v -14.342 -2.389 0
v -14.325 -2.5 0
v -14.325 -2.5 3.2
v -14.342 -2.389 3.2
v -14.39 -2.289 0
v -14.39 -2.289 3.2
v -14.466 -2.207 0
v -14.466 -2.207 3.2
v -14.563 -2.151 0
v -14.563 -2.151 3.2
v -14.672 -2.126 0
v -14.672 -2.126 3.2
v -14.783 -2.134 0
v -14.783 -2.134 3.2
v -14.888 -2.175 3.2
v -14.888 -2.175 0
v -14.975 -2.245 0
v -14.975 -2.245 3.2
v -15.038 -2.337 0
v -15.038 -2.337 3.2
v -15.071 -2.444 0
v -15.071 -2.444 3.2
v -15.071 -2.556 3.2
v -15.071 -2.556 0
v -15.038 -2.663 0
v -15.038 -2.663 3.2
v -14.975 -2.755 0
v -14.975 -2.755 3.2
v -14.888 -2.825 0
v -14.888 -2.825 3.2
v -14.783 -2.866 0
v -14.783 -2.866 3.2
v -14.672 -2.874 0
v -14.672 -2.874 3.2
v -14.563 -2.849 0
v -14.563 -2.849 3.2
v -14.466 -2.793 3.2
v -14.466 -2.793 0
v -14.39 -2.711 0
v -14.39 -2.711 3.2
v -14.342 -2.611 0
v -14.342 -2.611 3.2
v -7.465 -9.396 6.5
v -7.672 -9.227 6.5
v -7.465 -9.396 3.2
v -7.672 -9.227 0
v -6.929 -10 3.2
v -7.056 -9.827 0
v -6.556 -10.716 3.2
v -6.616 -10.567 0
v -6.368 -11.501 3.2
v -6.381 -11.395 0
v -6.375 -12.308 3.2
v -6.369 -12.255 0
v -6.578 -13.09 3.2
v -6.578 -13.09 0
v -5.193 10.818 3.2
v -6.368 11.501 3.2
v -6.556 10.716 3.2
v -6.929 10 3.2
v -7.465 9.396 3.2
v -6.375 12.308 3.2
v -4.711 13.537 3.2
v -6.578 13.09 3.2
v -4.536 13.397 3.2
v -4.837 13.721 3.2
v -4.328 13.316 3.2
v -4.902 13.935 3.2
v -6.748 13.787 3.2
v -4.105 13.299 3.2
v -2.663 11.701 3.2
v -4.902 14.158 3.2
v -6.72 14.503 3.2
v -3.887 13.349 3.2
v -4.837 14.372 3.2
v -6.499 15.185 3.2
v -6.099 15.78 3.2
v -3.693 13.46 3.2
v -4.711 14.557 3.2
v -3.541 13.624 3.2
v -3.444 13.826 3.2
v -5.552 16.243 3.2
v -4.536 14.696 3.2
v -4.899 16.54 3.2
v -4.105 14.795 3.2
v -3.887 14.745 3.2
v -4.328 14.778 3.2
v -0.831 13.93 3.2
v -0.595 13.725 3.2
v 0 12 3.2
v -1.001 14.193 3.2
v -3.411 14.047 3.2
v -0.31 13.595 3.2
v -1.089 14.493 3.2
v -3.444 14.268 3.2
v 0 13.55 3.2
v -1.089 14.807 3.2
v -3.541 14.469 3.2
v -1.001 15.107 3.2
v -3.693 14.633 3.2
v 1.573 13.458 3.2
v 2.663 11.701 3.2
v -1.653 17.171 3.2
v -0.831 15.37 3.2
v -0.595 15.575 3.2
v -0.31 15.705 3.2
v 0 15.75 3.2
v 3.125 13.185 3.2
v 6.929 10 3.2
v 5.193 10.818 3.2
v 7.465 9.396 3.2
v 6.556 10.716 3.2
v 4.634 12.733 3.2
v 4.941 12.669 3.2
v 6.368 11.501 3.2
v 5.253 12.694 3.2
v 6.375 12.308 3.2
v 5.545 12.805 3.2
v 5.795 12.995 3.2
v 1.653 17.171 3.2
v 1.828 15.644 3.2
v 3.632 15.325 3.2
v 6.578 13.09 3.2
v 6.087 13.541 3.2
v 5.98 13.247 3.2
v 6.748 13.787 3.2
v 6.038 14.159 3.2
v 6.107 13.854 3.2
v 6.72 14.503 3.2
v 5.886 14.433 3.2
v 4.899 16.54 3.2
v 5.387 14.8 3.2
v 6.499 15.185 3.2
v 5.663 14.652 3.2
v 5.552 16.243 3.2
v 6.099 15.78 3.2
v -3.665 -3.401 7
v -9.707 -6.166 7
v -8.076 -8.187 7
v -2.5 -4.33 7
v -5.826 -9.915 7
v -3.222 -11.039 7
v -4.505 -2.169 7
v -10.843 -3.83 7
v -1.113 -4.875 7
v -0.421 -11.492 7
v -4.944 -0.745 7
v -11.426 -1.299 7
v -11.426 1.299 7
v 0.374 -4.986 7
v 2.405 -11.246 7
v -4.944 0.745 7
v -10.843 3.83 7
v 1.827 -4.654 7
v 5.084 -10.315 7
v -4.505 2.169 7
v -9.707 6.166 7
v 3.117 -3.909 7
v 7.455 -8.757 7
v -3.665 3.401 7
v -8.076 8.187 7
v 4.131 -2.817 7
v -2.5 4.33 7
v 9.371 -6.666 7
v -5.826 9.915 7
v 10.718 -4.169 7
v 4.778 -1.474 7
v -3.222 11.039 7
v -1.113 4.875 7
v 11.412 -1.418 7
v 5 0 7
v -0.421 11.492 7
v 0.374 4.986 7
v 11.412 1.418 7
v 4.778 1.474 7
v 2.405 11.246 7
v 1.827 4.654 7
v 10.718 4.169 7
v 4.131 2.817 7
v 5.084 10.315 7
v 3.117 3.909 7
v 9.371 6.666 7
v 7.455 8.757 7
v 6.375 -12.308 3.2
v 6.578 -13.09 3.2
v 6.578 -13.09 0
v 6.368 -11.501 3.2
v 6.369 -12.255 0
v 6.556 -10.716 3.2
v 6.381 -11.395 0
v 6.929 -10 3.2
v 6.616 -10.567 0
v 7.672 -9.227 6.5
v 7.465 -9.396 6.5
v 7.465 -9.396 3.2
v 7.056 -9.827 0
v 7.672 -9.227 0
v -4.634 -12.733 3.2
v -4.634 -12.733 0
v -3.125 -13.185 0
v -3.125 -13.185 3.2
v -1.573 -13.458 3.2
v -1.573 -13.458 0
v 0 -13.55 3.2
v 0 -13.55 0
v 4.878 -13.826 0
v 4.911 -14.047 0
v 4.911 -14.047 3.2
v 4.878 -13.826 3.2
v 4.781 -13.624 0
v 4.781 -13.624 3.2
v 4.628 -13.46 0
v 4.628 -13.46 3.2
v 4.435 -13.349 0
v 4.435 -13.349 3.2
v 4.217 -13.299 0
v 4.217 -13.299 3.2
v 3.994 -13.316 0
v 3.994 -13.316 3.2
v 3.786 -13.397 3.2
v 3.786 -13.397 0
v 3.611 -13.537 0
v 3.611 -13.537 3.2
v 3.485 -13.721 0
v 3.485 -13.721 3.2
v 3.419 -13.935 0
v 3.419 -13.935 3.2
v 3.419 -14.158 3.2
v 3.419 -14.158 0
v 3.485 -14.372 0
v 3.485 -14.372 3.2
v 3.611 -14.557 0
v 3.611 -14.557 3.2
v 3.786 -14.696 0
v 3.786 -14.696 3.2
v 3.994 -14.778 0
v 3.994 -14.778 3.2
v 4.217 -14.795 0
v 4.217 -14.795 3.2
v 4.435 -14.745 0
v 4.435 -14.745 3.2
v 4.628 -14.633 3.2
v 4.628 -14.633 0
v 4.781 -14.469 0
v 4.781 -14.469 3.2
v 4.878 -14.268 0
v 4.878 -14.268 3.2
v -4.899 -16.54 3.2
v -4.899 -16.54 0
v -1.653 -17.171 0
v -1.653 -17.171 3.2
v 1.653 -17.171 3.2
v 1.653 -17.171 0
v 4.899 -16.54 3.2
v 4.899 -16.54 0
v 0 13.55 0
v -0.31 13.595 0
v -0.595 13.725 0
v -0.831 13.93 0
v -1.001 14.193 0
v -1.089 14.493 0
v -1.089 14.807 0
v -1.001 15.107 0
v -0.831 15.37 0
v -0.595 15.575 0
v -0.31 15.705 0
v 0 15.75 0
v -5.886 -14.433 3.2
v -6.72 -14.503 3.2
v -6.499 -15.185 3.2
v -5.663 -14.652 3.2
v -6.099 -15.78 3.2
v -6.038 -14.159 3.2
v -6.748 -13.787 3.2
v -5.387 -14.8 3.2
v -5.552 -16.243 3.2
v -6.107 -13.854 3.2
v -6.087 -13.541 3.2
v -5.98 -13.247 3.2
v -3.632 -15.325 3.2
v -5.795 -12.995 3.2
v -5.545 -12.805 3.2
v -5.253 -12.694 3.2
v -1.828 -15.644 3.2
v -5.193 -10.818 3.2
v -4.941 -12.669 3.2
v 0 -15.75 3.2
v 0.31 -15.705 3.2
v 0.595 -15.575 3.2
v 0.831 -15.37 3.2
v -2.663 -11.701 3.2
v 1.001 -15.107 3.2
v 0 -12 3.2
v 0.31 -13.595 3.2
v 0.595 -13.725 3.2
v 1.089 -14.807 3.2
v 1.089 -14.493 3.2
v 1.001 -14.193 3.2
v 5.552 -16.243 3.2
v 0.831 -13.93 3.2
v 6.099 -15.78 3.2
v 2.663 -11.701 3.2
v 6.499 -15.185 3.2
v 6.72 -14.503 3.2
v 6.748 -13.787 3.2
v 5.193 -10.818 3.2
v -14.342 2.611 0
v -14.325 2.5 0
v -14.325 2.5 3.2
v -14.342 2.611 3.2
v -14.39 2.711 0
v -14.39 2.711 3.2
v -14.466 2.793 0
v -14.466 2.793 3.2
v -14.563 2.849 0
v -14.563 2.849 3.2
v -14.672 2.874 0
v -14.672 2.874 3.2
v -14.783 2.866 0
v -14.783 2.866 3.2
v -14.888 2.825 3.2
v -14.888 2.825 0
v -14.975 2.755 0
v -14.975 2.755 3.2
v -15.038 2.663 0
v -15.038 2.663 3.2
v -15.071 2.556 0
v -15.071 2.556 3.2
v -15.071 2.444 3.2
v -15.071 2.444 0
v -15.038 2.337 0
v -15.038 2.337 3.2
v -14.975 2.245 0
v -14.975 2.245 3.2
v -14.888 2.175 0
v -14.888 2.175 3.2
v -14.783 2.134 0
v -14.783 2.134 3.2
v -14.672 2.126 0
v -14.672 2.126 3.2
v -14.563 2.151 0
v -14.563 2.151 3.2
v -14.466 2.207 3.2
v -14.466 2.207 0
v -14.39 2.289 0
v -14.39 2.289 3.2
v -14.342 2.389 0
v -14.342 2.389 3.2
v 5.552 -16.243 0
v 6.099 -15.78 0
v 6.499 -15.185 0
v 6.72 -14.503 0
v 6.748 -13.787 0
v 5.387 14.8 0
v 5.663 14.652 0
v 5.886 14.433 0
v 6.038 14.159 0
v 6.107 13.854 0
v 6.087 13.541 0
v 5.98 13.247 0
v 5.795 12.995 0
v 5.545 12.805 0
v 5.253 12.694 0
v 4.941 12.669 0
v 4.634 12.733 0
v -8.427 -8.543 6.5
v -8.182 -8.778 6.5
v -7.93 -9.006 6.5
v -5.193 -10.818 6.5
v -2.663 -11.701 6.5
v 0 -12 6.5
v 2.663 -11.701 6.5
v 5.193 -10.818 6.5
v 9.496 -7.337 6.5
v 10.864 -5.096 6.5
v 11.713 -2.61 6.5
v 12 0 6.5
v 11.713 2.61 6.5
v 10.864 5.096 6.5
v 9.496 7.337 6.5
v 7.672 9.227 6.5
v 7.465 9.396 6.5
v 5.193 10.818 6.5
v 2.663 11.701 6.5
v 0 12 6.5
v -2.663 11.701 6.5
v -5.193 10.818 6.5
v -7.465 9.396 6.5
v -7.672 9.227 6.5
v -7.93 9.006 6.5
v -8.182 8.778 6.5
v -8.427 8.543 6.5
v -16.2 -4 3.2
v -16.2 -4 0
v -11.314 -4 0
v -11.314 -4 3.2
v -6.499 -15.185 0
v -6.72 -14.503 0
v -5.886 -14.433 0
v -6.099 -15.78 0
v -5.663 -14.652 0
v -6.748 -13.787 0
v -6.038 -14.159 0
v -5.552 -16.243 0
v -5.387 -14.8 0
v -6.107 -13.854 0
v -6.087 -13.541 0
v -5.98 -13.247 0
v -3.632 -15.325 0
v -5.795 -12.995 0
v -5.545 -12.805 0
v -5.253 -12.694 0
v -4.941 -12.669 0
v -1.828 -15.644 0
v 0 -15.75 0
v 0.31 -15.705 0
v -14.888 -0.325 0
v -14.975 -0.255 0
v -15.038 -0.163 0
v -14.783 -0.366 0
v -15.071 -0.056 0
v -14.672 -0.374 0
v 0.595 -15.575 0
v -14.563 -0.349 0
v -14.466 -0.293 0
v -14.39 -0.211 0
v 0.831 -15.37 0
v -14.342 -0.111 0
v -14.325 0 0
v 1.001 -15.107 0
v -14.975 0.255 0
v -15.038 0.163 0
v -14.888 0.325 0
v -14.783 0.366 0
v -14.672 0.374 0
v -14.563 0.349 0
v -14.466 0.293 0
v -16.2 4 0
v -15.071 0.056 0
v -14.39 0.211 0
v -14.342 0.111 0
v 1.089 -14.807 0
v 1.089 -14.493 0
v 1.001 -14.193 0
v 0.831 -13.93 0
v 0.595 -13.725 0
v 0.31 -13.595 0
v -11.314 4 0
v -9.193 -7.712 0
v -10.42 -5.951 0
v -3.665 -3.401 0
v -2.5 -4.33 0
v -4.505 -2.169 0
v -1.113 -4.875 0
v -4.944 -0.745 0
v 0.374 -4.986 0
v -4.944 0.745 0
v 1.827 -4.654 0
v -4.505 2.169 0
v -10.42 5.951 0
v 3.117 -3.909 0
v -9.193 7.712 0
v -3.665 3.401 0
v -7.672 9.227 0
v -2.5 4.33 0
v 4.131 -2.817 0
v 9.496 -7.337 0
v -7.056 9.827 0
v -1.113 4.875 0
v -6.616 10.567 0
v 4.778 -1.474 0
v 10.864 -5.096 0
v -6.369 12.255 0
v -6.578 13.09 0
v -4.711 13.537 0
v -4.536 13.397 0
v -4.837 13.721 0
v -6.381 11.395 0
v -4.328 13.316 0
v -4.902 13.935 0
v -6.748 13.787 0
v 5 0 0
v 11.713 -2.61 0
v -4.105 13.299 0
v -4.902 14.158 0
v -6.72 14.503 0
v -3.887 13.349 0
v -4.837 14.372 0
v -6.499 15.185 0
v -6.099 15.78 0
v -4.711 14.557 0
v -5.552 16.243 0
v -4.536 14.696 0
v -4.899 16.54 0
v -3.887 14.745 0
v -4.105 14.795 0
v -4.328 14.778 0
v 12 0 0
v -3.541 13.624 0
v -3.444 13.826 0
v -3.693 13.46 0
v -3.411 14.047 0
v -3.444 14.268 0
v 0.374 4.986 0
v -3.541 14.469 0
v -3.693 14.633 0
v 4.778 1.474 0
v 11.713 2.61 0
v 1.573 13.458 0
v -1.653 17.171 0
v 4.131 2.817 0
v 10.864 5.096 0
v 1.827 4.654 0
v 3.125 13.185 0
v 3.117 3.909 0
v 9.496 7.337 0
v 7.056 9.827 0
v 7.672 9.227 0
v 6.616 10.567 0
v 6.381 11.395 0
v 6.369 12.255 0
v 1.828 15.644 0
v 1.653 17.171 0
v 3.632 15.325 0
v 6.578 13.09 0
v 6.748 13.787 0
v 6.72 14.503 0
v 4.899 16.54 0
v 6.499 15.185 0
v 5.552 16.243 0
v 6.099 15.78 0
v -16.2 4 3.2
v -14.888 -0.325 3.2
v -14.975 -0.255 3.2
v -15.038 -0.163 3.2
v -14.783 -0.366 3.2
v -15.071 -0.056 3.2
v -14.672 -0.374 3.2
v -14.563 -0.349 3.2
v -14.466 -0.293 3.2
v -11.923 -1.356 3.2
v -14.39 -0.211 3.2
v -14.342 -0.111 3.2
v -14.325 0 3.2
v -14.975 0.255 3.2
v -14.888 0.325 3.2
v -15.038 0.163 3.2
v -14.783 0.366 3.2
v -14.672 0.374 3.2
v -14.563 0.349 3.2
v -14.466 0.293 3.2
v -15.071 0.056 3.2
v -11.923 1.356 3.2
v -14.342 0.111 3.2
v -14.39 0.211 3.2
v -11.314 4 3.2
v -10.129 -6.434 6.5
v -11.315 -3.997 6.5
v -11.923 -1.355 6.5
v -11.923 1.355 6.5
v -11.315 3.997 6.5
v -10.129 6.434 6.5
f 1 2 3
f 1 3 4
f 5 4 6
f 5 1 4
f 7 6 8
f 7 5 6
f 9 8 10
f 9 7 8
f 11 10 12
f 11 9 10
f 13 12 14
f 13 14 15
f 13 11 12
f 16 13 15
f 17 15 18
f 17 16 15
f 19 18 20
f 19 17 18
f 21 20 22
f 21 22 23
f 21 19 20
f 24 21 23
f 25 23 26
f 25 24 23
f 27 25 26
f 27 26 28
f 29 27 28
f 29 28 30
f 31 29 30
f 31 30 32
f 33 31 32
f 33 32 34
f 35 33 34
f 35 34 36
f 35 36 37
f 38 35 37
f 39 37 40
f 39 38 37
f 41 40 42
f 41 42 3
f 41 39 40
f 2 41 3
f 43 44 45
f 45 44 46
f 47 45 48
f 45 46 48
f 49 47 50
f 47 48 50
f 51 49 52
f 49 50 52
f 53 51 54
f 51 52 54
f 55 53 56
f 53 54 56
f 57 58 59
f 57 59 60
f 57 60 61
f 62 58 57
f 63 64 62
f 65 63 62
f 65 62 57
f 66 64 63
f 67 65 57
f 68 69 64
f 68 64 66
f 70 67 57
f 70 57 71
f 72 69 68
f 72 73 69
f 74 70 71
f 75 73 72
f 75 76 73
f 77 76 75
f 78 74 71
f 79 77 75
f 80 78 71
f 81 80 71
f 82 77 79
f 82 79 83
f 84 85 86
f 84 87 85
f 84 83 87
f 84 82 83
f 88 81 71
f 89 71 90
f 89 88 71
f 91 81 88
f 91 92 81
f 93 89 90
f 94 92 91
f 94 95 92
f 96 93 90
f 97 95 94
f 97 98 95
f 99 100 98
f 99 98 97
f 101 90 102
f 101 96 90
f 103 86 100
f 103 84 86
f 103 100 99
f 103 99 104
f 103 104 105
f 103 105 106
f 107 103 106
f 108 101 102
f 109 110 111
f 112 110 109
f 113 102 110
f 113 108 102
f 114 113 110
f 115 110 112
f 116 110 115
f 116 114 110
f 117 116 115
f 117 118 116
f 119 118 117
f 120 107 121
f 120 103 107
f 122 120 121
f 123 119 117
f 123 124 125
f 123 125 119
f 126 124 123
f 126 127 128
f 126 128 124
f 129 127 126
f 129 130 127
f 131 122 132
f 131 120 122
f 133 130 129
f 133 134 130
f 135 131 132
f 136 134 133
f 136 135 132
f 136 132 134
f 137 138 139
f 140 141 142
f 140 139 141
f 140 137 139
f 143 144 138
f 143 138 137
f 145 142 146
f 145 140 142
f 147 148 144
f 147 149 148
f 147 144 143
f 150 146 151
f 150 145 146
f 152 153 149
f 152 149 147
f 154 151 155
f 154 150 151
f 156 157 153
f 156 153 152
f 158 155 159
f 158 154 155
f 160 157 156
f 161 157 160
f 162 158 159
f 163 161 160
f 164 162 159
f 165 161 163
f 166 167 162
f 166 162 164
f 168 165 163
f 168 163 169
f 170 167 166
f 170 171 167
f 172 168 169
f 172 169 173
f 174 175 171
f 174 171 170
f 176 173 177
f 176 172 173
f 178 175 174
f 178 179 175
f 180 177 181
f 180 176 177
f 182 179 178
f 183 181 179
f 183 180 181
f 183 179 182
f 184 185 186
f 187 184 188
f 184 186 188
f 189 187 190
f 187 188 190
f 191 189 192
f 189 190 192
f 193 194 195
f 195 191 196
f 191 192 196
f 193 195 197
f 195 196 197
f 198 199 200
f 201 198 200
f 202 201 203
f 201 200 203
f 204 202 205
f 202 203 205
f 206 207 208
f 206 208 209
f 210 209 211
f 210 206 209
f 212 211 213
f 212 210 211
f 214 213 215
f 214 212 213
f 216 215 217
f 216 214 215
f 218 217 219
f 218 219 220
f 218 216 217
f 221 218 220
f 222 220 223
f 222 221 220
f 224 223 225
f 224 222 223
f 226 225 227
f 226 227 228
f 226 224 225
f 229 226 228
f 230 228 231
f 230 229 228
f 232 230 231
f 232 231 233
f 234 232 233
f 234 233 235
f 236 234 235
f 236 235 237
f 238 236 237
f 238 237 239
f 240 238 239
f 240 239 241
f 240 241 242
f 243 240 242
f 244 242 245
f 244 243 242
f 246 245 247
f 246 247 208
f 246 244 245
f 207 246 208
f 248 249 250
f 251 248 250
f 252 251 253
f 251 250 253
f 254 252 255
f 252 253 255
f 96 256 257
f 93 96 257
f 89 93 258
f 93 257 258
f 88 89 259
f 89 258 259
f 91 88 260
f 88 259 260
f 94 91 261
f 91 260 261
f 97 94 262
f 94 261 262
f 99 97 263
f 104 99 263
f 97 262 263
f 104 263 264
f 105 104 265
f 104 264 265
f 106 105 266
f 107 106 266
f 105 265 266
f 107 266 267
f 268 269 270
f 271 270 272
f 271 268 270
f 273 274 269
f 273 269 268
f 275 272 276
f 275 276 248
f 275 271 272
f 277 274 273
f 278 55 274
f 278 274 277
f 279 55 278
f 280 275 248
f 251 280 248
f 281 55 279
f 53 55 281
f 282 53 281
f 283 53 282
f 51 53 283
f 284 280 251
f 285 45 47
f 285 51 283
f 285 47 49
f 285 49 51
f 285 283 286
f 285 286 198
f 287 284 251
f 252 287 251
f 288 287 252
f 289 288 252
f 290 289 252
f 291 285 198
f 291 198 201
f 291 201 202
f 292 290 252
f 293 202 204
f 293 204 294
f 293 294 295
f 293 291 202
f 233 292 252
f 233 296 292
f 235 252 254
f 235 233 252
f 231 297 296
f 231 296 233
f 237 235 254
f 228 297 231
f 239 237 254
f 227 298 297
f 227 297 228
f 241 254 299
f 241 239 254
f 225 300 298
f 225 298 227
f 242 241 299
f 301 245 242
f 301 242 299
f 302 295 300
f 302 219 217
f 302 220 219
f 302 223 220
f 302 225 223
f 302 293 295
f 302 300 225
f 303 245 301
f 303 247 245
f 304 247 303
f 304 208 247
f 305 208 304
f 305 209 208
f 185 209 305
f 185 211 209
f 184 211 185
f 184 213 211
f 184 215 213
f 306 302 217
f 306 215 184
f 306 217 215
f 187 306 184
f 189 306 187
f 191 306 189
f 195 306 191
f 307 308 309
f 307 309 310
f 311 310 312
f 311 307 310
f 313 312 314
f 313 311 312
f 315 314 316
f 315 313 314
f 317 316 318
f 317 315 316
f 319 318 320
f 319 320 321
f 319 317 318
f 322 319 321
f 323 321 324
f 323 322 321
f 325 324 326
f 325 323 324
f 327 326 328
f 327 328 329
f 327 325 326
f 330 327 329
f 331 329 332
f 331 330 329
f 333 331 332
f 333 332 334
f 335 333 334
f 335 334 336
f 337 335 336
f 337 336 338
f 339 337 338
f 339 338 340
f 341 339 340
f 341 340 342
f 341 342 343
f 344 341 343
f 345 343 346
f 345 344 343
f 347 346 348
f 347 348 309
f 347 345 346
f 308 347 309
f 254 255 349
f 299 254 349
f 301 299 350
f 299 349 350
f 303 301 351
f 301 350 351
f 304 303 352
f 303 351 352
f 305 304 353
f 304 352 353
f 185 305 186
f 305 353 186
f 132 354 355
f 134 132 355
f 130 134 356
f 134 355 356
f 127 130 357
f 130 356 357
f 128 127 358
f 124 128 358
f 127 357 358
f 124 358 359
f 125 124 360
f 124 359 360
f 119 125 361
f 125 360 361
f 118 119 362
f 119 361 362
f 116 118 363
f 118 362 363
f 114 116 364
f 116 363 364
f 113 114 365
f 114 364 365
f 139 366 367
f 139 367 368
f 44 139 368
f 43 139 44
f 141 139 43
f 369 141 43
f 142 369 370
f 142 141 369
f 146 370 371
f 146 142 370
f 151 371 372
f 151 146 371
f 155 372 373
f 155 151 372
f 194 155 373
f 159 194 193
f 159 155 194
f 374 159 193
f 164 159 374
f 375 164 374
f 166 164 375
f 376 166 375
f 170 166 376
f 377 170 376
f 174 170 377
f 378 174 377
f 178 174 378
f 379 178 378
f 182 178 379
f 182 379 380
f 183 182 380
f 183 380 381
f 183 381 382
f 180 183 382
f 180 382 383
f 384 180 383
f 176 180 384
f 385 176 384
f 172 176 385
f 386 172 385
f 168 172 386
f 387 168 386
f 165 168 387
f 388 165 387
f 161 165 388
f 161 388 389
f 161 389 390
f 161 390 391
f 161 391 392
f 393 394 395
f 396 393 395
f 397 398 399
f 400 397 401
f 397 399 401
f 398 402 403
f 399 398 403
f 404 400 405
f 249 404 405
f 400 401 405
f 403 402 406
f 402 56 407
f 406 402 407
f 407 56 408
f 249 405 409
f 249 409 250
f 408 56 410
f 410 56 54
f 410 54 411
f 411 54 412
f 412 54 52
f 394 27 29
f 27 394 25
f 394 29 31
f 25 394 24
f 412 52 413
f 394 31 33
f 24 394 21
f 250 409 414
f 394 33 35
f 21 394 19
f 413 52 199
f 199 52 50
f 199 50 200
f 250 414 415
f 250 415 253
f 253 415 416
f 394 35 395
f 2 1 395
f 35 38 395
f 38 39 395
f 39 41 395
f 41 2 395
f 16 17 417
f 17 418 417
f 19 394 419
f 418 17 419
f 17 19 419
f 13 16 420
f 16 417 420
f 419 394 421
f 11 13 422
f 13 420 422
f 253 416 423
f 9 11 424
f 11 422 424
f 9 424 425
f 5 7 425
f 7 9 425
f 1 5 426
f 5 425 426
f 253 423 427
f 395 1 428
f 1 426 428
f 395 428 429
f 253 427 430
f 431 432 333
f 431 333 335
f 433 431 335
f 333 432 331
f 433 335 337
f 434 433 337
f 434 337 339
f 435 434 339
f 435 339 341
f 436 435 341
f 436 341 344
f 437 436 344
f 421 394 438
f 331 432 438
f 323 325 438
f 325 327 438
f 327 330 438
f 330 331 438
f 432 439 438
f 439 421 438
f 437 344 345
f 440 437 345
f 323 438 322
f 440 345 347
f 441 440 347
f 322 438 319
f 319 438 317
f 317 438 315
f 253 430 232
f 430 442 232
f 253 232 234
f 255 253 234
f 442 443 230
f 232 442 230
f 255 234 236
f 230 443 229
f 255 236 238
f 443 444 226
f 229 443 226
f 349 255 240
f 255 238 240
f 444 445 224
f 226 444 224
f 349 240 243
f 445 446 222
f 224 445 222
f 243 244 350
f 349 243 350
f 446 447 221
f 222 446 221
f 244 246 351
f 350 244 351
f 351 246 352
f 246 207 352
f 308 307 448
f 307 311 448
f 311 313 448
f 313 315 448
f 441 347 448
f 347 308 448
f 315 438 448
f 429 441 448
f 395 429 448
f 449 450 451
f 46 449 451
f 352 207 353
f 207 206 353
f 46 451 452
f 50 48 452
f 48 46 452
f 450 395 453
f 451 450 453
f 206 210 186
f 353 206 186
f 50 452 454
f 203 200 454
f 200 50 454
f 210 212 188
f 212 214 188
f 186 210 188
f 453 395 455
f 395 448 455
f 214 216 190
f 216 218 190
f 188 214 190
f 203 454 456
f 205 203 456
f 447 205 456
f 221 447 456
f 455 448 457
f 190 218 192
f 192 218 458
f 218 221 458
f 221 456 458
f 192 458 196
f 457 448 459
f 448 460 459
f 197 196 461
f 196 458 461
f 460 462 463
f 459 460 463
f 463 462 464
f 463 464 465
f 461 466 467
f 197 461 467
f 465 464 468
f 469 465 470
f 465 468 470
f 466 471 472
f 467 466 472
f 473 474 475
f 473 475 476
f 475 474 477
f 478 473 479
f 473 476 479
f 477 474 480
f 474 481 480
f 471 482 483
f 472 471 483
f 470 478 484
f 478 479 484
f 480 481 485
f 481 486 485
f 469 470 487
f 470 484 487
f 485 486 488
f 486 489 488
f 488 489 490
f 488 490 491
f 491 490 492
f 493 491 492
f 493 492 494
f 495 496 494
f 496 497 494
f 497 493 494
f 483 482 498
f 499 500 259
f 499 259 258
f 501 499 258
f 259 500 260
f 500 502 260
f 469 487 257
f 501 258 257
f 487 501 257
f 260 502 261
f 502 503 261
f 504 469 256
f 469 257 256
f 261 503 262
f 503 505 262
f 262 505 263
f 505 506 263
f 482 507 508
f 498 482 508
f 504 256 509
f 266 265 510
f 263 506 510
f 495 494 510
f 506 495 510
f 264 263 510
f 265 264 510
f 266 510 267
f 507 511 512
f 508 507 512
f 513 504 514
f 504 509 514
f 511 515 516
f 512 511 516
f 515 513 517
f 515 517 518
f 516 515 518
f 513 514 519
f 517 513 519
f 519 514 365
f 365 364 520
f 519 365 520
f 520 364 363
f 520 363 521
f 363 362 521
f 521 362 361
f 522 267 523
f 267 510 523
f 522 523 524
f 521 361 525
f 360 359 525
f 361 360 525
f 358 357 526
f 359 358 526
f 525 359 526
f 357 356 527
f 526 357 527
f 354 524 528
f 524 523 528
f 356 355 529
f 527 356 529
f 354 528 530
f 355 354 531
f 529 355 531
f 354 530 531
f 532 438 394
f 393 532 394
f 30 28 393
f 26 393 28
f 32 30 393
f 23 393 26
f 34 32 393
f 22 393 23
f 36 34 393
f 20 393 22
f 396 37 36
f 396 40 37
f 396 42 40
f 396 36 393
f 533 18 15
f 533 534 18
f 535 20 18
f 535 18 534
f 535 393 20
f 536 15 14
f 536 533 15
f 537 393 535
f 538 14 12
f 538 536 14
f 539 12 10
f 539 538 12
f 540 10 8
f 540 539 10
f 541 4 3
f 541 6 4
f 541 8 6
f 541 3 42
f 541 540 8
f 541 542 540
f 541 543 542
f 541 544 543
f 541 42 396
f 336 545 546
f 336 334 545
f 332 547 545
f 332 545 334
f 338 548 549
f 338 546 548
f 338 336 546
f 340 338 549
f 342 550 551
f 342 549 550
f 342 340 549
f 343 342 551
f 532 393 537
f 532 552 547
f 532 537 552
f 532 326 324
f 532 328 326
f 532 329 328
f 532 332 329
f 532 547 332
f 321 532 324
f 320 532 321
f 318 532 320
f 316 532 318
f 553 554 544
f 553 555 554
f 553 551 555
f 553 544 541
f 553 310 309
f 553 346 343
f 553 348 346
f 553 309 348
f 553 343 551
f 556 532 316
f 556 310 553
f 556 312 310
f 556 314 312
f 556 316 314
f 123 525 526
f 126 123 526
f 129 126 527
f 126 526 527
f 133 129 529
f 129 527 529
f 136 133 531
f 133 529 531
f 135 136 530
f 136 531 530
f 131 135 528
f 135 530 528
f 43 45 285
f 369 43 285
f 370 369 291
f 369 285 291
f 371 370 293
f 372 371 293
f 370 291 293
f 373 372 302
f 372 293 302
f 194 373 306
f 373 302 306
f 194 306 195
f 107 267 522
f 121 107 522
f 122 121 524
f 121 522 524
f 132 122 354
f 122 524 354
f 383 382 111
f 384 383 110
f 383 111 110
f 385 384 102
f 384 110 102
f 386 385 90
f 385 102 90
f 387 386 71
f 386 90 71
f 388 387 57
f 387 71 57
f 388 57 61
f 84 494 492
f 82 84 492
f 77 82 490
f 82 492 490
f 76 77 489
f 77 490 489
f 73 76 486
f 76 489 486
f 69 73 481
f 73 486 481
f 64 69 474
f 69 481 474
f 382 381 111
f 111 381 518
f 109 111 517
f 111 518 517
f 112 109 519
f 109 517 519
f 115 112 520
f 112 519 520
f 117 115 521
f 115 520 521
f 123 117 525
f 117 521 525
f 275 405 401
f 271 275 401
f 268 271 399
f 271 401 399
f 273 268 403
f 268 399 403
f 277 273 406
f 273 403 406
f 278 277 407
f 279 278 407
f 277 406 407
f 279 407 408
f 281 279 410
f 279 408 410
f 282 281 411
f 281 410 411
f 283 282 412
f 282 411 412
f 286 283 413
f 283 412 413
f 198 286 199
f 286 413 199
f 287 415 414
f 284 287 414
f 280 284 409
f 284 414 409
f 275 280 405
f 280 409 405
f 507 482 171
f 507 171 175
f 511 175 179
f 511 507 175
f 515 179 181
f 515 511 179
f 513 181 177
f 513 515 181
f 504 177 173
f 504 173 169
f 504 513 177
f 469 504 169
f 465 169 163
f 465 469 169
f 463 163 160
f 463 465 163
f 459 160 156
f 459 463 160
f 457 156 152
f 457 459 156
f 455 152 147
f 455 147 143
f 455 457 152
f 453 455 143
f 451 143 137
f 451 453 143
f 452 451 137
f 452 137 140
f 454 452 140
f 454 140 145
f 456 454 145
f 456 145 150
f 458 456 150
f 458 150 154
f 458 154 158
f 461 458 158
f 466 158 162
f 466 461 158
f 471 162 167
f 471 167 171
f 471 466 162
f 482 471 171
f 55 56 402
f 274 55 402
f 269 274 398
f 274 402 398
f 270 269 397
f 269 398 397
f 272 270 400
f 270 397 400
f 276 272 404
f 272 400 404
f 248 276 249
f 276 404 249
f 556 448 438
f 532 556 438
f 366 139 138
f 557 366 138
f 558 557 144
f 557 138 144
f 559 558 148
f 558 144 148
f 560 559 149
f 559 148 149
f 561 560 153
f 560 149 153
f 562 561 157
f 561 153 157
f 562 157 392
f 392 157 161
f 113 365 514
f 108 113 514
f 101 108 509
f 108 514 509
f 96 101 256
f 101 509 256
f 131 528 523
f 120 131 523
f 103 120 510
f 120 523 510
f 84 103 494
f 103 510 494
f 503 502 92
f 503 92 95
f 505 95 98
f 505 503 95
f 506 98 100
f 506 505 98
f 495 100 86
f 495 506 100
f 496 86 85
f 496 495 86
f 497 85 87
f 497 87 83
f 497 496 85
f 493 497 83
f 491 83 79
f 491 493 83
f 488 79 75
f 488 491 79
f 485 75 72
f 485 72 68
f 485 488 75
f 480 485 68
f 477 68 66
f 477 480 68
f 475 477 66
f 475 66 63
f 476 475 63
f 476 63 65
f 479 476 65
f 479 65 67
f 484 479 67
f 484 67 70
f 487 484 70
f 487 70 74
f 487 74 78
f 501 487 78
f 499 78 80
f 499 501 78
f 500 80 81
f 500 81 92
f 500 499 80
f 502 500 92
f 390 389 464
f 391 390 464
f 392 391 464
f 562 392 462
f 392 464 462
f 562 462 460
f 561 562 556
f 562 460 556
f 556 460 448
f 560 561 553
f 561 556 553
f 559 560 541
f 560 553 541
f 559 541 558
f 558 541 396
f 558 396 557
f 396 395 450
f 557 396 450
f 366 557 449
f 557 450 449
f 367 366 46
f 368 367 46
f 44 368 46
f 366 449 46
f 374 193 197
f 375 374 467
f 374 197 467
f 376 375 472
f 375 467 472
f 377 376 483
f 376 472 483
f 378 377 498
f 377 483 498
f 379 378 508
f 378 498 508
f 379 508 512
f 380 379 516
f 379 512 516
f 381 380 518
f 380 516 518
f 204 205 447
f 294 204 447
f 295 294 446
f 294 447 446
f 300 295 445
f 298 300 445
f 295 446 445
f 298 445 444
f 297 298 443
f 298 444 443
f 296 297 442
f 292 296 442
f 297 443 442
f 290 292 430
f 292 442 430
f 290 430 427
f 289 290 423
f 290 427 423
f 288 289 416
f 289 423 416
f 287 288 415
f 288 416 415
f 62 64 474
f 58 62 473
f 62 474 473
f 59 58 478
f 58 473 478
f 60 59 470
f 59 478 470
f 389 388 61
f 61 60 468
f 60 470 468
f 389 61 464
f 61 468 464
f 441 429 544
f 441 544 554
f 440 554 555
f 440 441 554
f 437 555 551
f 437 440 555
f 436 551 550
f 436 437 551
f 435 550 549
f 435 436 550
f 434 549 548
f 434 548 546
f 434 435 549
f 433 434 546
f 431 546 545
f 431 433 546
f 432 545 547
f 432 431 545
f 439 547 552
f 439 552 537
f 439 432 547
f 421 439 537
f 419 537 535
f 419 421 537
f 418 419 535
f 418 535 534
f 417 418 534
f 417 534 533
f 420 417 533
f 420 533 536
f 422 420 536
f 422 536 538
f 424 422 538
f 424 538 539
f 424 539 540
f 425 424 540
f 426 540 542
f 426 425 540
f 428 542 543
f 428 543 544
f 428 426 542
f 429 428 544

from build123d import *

# Parameters (mm, degrees)
SKETCH1_R           = 5
BOSS_EXTRUDE1_DEPTH = 7
SKETCH1_3_R         = 0.75
SKETCH1_3_R_2       = 0.37500000000000105
SKETCH1_3_R_3       = 0.375000000000001
SKETCH1_3_R_4       = 0.7500000000000001
BOSS_EXTRUDE2_DEPTH = 3.2
CHAMFER1_SIZE       = 0.5


with BuildPart() as part:
    # Sketch1 → Boss-Extrude1 (new body)
    with BuildSketch(Plane.XY):
        with BuildLine():
            ThreePointArc((-7.67241426287147, 9.226811983501475), (-9.846222893058407, 6.8594383691533025), (-11.31370849898476, 4))
            ThreePointArc((-11.31370849898476, 4), (-12, 1.47e-15), (-11.313708498984761, -3.9999999999999973))
            ThreePointArc((-11.313708498984761, -3.9999999999999973), (-9.846222893058428, -6.859438369153274), (-7.672414262871522, -9.226811983501433))
            ThreePointArc((-7.672414262871518, -9.226811983501431), (-7.566872377799013, -9.309109229750973), (-7.464748895834485, -9.395611950380768))
            ThreePointArc((-7.464748895834483, -9.395611950380767), (1.911e-14, -12), (7.464748895834521, -9.395611950380736))
            ThreePointArc((7.464748895834522, -9.395611950380738), (7.566872377798977, -9.309109229751012), (7.6724142628714045, -9.226811983501536))
            ThreePointArc((7.672414262871396, -9.226811983501538), (10.864367702596793, -5.0956368024783405), (12, -2.94e-15))
            ThreePointArc((12, 0), (10.864367702596812, 5.095636802478297), (7.672414262871458, 9.226811983501484))
            ThreePointArc((7.672414262871453, 9.22681198350148), (7.5668723777987985, 9.309109229751144), (7.4647488958341315, 9.395611950381072))
            ThreePointArc((7.464748895834118, 9.395611950381056), (-2.7638e-13, 12), (-7.464748895834552, 9.395611950380712))
            ThreePointArc((-7.464748895834552, 9.395611950380712), (-7.566872377799023, 9.30910922975097), (-7.672414262871468, 9.226811983501477))
        make_face()
        Circle(SKETCH1_R, mode=Mode.SUBTRACT)
    extrude(amount=BOSS_EXTRUDE1_DEPTH)

    # Sketch1<3> → Boss-Extrude2 (add)
    # profile 1 of 3: a face of its own
    with BuildSketch(Plane.XY):
        with BuildLine():
            ThreePointArc((-6.57839458957231, 13.089966563130929), (-6.4376977661817865, 11.10270546197924), (-7.464748895834552, 9.395611950380712))
            ThreePointArc((-7.464748895834552, 9.395611950380712), (-2.7638e-13, 12), (7.464748895834118, 9.395611950381056))
            ThreePointArc((7.4647488958341315, 9.395611950381072), (6.437697766181707, 11.102705461979504), (6.578394589572291, 13.089966563130933))
            ThreePointArc((6.578394589572291, 13.089966563130933), (6.498593335336791, 15.184618723292306), (4.899264696142665, 16.53964042647633))
            ThreePointArc((4.899264696142668, 16.539640426476332), (-9.55e-15, 17.250000000000007), (-4.899264696142684, 16.539640426476325))
            ThreePointArc((-4.899264696142685, 16.539640426476325), (-6.49859333533681, 15.184618723292303), (-6.57839458957231, 13.089966563130929))
        make_face()
        with Locations((-4.160824799912482, 14.046709115819024)):
            Circle(SKETCH1_3_R, mode=Mode.SUBTRACT)
        with BuildLine():
            ThreePointArc((-2e-17, 13.55), (-1.1000000000000003, 14.65), (1.8e-16, 15.75))
            ThreePointArc((1.8e-16, 15.75), (2.734958798254155, 15.510722109942275), (5.3868172573792865, 14.800158777378059))
            ThreePointArc((5.3868172573792865, 14.800158777378059), (6.04425698258554, 13.390274736855329), (4.634372942062814, 12.732835011649062))
            ThreePointArc((4.634372942062814, 12.732835011649065), (2.352932807386907, 13.344145053315419), (-2e-17, 13.550000000000002))
        make_face(mode=Mode.SUBTRACT)
    # profile 2 of 3: a face of its own
    with BuildSketch(Plane.XY):
        with BuildLine():
            Line((-11.313708498984761, 3.9999999999999982), (-16.2, 4))
            Line((-16.2, 4), (-16.2, -4))
            Line((-16.2, -4), (-11.313708498984761, -3.9999999999999982))
            ThreePointArc((-11.313708498984761, -3.9999999999999973), (-12, 1.47e-15), (-11.31370849898476, 4))
        make_face()
        with Locations((-14.7, -2.5)):
            Circle(SKETCH1_3_R_2, mode=Mode.SUBTRACT)
        with Locations((-14.7, 0)):
            Circle(SKETCH1_3_R_3, mode=Mode.SUBTRACT)
        with Locations((-14.7, 2.5)):
            Circle(SKETCH1_3_R_2, mode=Mode.SUBTRACT)
    # profile 3 of 3: a face of its own
    with BuildSketch(Plane.XY):
        with BuildLine():
            ThreePointArc((7.464748895834521, -9.395611950380736), (1.911e-14, -12), (-7.464748895834483, -9.395611950380767))
            ThreePointArc((-7.464748895834485, -9.395611950380768), (-6.437697766181827, -11.102705461979276), (-6.578394589572382, -13.08996656313089))
            ThreePointArc((-6.578394589572383, -13.08996656313089), (-6.498593335336874, -15.184618723292306), (-4.899264696142685, -16.539640426476325))
            ThreePointArc((-4.899264696142686, -16.539640426476325), (-2e-15, -17.250000000000004), (4.899264696142684, -16.53964042647633))
            ThreePointArc((4.899264696142683, -16.539640426476325), (6.498593335336733, -15.184618723292296), (6.57839458957222, -13.089966563130977))
            ThreePointArc((6.57839458957222, -13.089966563130977), (6.437697766181717, -11.102705461979264), (7.464748895834522, -9.395611950380738))
        make_face()
        with BuildLine():
            ThreePointArc((-4.634372942062905, -12.732835011649033), (-2.3529328073870017, -13.344145053315408), (-9.46e-14, -13.550000000000006))
            ThreePointArc((-9.46e-14, -13.550000000000004), (1.099999999999898, -14.650000000000011), (-1.1017e-13, -15.750000000000004))
            ThreePointArc((-1.1017e-13, -15.750000000000004), (-2.734958798254263, -15.510722109942261), (-5.3868172573793895, -14.800158777378023))
            ThreePointArc((-5.3868172573793895, -14.800158777378021), (-6.044256982585632, -13.390274736855288), (-4.634372942062904, -12.73283501164903))
        make_face(mode=Mode.SUBTRACT)
        with Locations((4.160824799912384, -14.046709115819057)):
            Circle(SKETCH1_3_R_4, mode=Mode.SUBTRACT)
    extrude(amount=BOSS_EXTRUDE2_DEPTH)

    # Chamfer1
    # the kernel refuses this chamfer: 0.5 mm, written as the material it takes off along each edge
    with BuildSketch(Plane(origin=(4.4e-16, 8.88e-15, 7), x_dir=(-0.7022542311891906, -0.7119262565581345, 0), z_dir=(-0.7119262565581345, 0.7022542311891906, 0))) as chamfer1_piece_1:
        Polygon((12.00000000000001, -CHAMFER1_SIZE), (12.00000000000001 - CHAMFER1_SIZE, 0), (12.00000000000001, 0), align=None)
    revolve(axis=Axis((4.4e-16, 8.88e-15, 7), (0, 0, 1)), revolution_arc=89.21628448783436, mode=Mode.SUBTRACT)
    with BuildSketch(Plane(origin=(0, -1.55e-15, 7), x_dir=(0.5534232565861029, 0.8329001735319981, 0), z_dir=(-0.8329001735319981, 0.5534232565861029, 0))) as chamfer1_piece_2:
        Polygon((12.000000000000009, CHAMFER1_SIZE), (12.000000000000009 - CHAMFER1_SIZE, 0), (12.000000000000009, 0), align=None)
    revolve(axis=Axis((0, -1.55e-15, 7), (0, 0, -1)), revolution_arc=112.79563771505457, mode=Mode.SUBTRACT)
    with BuildSketch(Plane(origin=(0, 0, 7), x_dir=(0.7022542311891632, 0.7119262565581616, 0), z_dir=(0.7119262565581616, -0.7022542311891632, 0))) as chamfer1_piece_3:
        Polygon((12.000000000000002, -CHAMFER1_SIZE), (12.000000000000002 - CHAMFER1_SIZE, 0), (12.000000000000002, 0), align=None)
    revolve(axis=Axis((0, 0, 7), (0, 0, 1)), revolution_arc=89.2162844878324, mode=Mode.SUBTRACT)
    with BuildSketch(Plane(origin=(-2.309e-14, -1.688e-14, 7), x_dir=(-0.5534232565861079, -0.8329001735319947, 0), z_dir=(0.8329001735319947, -0.5534232565861079, 0))) as chamfer1_piece_4:
        Polygon((12.00000000000003, CHAMFER1_SIZE), (12.00000000000003 - CHAMFER1_SIZE, 0), (12.00000000000003, 0), align=None)
    revolve(axis=Axis((-2.309e-14, -1.688e-14, 7), (0, 0, -1)), revolution_arc=112.79563771505396, mode=Mode.SUBTRACT)


solid = part.part
